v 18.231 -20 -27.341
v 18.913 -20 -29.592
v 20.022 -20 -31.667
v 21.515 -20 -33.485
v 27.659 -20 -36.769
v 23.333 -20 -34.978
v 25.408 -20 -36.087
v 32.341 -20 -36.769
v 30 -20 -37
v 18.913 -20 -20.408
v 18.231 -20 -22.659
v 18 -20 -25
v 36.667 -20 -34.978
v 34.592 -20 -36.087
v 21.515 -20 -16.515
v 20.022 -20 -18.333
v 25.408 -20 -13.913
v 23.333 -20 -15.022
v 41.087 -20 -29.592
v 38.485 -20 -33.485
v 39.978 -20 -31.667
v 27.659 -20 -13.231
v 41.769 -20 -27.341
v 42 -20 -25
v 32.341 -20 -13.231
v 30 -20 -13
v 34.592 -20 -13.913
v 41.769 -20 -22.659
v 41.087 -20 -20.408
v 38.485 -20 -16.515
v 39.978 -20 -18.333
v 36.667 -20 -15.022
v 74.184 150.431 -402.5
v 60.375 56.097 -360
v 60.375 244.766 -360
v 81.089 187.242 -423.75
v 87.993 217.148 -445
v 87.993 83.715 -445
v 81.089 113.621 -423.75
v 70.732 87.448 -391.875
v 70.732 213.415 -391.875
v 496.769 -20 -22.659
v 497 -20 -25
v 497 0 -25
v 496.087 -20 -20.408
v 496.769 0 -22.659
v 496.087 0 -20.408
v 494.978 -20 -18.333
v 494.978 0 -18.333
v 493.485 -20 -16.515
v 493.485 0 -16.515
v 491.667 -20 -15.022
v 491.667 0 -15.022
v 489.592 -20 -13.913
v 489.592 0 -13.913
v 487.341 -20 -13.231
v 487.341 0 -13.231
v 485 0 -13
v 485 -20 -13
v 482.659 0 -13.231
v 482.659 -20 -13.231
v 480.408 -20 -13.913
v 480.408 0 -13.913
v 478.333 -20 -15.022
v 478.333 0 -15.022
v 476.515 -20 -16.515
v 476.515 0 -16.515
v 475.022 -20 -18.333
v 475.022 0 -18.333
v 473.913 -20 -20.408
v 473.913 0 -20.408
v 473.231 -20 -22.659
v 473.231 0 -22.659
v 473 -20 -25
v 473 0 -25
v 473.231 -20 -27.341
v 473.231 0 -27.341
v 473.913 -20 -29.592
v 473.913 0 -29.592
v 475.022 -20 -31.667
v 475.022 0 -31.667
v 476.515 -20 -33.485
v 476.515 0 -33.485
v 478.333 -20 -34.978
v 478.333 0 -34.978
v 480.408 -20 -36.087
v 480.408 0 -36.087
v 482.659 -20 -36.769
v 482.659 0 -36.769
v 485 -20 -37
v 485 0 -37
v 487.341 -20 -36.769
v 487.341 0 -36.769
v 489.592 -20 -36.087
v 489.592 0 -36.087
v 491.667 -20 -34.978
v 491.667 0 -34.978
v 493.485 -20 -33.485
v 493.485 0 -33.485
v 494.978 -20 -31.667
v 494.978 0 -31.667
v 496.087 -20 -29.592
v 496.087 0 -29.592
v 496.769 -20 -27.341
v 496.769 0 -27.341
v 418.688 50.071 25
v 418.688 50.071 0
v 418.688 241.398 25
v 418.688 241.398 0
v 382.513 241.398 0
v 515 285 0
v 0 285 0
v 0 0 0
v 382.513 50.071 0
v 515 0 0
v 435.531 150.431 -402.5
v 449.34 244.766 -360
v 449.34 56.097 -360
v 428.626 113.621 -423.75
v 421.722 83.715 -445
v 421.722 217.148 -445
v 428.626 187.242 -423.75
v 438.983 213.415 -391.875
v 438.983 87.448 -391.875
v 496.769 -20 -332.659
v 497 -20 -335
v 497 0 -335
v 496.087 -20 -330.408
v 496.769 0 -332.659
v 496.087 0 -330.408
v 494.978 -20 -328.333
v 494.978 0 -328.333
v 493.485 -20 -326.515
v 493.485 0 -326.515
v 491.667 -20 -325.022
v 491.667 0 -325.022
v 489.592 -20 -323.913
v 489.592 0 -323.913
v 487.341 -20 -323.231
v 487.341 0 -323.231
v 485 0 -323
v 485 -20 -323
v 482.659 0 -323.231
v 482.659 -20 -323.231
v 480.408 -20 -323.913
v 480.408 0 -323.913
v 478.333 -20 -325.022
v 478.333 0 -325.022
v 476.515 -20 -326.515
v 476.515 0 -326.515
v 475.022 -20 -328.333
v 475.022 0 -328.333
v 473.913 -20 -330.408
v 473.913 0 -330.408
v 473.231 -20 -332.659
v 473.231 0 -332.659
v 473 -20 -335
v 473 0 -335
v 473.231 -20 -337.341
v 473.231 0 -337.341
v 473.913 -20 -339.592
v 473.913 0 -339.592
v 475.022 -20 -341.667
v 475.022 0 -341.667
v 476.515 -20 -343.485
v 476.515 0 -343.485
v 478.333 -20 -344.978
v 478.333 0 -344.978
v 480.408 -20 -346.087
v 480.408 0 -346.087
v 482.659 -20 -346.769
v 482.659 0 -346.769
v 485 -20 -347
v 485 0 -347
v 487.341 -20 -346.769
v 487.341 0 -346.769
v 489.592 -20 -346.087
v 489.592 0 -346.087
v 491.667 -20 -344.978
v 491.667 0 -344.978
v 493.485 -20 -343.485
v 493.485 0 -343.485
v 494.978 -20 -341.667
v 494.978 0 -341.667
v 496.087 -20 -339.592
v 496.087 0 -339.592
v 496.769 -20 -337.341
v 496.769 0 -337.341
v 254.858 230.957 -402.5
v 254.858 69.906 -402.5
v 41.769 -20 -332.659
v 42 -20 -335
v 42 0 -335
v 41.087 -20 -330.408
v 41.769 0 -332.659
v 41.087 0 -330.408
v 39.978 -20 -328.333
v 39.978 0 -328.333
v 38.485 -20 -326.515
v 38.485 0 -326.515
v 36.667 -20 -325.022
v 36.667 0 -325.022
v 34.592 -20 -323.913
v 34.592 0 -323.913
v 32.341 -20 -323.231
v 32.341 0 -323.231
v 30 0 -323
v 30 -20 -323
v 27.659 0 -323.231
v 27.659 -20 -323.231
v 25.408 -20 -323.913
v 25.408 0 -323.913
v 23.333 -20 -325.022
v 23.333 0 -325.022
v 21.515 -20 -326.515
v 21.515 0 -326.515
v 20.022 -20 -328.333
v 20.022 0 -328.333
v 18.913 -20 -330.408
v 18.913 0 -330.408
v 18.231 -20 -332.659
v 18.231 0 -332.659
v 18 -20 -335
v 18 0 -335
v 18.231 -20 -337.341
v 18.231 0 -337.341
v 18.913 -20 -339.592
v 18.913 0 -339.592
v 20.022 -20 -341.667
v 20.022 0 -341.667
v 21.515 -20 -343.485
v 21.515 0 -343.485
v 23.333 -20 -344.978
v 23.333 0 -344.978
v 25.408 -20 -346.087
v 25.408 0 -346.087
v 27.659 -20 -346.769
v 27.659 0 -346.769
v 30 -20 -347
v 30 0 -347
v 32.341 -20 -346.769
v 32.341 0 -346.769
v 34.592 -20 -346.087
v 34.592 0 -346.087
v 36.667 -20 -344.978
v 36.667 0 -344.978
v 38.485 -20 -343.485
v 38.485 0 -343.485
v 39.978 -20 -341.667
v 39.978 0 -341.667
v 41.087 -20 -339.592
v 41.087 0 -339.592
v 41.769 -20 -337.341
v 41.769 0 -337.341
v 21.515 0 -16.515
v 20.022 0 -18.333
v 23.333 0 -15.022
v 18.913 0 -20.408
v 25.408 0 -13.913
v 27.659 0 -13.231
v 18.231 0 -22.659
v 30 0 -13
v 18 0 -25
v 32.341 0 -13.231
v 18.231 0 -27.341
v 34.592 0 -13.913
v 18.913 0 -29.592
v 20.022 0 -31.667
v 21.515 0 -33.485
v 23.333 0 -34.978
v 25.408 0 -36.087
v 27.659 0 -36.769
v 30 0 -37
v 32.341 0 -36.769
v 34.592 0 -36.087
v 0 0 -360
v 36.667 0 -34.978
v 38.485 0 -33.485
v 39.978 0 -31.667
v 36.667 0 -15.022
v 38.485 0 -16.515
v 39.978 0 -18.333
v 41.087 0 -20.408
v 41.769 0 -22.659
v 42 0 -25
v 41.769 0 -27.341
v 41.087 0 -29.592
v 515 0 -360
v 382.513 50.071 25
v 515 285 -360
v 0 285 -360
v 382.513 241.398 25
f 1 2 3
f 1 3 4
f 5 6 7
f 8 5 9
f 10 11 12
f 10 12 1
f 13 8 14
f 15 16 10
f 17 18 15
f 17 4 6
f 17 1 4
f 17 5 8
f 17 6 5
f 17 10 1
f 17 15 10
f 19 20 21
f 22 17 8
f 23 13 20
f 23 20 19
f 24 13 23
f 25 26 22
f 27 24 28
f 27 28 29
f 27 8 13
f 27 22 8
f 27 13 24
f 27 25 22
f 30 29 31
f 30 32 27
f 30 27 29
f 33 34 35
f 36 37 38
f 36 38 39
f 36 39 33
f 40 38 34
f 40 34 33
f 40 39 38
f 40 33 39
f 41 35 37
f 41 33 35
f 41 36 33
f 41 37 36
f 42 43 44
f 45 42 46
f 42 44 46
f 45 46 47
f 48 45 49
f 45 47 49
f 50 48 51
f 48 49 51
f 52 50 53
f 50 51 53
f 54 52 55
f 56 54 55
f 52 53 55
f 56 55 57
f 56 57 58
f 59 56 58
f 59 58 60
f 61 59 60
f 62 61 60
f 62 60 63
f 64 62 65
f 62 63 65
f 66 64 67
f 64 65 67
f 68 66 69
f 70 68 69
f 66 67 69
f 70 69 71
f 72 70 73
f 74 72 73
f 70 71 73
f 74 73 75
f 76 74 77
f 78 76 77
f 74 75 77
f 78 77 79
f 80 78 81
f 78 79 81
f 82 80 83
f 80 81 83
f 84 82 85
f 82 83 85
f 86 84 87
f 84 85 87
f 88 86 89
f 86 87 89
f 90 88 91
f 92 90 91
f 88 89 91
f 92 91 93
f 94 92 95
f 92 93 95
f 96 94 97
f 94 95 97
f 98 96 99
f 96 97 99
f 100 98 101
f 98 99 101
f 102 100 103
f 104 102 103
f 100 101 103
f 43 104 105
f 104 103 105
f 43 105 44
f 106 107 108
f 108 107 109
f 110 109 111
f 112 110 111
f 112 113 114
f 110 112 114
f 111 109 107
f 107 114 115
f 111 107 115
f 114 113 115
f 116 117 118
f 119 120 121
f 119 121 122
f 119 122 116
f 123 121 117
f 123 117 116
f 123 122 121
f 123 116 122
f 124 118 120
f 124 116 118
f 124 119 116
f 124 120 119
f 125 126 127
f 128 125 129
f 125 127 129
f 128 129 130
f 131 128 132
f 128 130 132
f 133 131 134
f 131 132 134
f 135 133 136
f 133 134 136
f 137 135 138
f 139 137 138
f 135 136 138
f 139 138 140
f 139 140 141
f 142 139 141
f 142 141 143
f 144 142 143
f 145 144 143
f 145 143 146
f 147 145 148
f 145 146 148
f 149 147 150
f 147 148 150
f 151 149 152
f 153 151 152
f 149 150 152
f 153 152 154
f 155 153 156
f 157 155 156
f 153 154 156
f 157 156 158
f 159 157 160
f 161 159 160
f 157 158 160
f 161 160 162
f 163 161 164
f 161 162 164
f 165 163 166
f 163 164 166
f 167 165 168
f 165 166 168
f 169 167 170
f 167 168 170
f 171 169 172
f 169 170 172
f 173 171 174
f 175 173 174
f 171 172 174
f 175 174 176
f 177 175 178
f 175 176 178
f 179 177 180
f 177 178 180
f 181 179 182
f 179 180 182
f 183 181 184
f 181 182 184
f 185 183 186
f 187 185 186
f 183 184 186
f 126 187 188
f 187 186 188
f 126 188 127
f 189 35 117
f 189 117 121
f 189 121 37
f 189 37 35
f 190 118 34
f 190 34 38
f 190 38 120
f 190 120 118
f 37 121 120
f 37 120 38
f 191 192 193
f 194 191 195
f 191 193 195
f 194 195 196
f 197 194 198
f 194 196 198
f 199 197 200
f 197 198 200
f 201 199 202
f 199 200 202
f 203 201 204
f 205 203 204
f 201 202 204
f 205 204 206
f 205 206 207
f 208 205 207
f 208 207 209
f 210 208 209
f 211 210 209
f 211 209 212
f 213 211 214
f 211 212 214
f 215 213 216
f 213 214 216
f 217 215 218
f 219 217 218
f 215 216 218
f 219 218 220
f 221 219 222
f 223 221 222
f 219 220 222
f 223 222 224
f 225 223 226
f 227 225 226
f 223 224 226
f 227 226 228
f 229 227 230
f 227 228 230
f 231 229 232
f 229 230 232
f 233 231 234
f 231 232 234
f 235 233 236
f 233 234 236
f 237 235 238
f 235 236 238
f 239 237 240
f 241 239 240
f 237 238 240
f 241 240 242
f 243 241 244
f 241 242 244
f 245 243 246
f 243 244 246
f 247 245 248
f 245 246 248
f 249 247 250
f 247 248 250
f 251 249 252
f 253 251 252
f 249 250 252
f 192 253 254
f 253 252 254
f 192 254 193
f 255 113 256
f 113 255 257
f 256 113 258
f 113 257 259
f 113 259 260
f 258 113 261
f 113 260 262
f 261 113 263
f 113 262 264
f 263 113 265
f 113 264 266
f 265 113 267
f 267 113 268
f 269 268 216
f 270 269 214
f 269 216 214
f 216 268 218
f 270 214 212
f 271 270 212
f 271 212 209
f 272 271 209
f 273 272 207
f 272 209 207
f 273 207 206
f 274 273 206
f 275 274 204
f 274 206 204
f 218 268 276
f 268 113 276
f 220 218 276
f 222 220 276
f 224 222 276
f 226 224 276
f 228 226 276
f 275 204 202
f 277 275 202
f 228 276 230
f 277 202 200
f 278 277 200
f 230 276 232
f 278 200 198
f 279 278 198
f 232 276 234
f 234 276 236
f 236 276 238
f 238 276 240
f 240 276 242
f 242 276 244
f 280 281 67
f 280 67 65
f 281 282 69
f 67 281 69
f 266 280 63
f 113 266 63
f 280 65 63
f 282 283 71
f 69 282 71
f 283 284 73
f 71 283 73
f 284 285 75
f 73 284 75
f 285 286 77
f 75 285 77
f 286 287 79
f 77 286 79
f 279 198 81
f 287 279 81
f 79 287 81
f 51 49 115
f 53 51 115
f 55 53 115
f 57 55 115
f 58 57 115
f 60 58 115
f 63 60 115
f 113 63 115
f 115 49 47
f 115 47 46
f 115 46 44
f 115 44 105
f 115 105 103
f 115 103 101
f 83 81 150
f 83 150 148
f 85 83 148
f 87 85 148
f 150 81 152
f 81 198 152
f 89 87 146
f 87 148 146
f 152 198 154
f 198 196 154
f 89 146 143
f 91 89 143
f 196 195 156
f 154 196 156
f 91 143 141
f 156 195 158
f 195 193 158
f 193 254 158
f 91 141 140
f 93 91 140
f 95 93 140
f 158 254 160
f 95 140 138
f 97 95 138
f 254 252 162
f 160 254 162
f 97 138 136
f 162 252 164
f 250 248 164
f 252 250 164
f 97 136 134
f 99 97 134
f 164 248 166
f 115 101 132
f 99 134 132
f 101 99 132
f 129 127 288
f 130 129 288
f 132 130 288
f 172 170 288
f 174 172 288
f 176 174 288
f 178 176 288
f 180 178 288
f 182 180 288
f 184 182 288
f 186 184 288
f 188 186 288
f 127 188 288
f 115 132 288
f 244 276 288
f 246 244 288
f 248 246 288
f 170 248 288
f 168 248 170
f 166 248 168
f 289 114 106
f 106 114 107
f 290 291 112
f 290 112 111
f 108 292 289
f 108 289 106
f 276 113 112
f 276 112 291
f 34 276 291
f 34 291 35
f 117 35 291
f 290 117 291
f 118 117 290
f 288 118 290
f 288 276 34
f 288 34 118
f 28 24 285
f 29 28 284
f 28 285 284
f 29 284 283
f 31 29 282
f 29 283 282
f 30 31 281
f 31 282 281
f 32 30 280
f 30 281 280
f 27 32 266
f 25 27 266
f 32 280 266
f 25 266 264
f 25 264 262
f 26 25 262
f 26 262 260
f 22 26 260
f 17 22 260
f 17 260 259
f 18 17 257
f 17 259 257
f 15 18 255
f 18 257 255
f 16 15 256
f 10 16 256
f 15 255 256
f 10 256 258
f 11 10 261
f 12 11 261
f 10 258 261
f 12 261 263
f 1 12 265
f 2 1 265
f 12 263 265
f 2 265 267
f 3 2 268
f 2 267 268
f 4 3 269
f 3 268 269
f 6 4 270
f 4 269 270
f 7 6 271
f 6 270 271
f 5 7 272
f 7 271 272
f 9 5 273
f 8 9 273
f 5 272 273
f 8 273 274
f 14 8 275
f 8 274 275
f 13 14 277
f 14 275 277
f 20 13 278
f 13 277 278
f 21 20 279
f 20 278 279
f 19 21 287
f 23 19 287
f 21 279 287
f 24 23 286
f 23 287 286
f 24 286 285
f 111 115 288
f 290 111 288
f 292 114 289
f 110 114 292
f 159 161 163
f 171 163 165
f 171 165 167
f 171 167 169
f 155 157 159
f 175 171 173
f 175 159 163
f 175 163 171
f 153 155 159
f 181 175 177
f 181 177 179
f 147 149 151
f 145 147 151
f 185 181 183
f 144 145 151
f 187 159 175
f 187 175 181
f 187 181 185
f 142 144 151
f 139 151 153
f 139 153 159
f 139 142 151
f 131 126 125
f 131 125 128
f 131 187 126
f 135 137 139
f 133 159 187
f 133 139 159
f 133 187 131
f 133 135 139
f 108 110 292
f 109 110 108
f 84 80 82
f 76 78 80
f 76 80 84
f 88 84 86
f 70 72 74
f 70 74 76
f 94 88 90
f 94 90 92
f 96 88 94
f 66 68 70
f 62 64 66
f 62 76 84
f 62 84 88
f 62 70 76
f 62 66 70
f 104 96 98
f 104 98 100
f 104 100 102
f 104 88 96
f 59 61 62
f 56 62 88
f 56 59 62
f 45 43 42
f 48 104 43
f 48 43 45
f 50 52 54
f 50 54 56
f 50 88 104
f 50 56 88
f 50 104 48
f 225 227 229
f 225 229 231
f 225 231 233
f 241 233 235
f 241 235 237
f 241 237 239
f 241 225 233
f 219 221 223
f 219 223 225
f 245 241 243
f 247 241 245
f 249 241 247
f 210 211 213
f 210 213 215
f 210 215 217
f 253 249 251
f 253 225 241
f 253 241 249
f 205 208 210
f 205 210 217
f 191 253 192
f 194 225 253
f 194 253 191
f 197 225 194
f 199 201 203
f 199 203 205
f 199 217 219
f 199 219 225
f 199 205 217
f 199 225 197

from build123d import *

# Parameters (mm, degrees)
SKETCH_2_W      = 515
SKETCH_2_H      = 360
EXTRUDE_1_DEPTH = 285
SKETCH_3_R      = 12
EXTRUDE_2_DEPTH = 20
SKETCH_4_W      = 36.17518645
SKETCH_4_H      = 191.327135514
EXTRUDE_3_DEPTH = 25
SKETCH_5_W      = 388.964610797
SKETCH_5_H      = 188.668975617
EXTRUDE_4_DEPTH = 85
EXTRUDE_4_TAPER = 18


with BuildPart() as part:
    # Эскиз2 → Бобышка-Вытянуть1 (new body)
    with BuildSketch(Plane(origin=(0, 0, 0), x_dir=(1, 0, 0), z_dir=(0, 1, 0))):
        with Locations((257.5, 180)):
            Rectangle(SKETCH_2_W, SKETCH_2_H)
    extrude(amount=EXTRUDE_1_DEPTH)

    # Эскиз3 → Бобышка-Вытянуть2 (add)
    with BuildSketch(Plane.XZ):
        with Locations((30, -25)):
            Circle(SKETCH_3_R)
        with Locations((30, -335)):
            Circle(SKETCH_3_R)
        with Locations((485, -335)):
            Circle(SKETCH_3_R)
        with Locations((485, -25)):
            Circle(SKETCH_3_R)
    extrude(amount=EXTRUDE_2_DEPTH)

    # Эскиз4 → Бобышка-Вытянуть3 (add)
    with BuildSketch(Plane.XY):
        with Locations((400.600187064, 145.73424428)):
            Rectangle(SKETCH_4_W, SKETCH_4_H)
    extrude(amount=EXTRUDE_3_DEPTH)

    # Эскиз5 → Бобышка-Вытянуть4 (add)
    with BuildSketch(Plane(origin=(0, 0, -360), x_dir=(-1, 0, 0), z_dir=(0, 0, -1))):
        with Locations((-254.857577373, 150.431495615)):
            Rectangle(SKETCH_5_W, SKETCH_5_H)
    extrude(amount=EXTRUDE_4_DEPTH, taper=EXTRUDE_4_TAPER)


solid = part.part
